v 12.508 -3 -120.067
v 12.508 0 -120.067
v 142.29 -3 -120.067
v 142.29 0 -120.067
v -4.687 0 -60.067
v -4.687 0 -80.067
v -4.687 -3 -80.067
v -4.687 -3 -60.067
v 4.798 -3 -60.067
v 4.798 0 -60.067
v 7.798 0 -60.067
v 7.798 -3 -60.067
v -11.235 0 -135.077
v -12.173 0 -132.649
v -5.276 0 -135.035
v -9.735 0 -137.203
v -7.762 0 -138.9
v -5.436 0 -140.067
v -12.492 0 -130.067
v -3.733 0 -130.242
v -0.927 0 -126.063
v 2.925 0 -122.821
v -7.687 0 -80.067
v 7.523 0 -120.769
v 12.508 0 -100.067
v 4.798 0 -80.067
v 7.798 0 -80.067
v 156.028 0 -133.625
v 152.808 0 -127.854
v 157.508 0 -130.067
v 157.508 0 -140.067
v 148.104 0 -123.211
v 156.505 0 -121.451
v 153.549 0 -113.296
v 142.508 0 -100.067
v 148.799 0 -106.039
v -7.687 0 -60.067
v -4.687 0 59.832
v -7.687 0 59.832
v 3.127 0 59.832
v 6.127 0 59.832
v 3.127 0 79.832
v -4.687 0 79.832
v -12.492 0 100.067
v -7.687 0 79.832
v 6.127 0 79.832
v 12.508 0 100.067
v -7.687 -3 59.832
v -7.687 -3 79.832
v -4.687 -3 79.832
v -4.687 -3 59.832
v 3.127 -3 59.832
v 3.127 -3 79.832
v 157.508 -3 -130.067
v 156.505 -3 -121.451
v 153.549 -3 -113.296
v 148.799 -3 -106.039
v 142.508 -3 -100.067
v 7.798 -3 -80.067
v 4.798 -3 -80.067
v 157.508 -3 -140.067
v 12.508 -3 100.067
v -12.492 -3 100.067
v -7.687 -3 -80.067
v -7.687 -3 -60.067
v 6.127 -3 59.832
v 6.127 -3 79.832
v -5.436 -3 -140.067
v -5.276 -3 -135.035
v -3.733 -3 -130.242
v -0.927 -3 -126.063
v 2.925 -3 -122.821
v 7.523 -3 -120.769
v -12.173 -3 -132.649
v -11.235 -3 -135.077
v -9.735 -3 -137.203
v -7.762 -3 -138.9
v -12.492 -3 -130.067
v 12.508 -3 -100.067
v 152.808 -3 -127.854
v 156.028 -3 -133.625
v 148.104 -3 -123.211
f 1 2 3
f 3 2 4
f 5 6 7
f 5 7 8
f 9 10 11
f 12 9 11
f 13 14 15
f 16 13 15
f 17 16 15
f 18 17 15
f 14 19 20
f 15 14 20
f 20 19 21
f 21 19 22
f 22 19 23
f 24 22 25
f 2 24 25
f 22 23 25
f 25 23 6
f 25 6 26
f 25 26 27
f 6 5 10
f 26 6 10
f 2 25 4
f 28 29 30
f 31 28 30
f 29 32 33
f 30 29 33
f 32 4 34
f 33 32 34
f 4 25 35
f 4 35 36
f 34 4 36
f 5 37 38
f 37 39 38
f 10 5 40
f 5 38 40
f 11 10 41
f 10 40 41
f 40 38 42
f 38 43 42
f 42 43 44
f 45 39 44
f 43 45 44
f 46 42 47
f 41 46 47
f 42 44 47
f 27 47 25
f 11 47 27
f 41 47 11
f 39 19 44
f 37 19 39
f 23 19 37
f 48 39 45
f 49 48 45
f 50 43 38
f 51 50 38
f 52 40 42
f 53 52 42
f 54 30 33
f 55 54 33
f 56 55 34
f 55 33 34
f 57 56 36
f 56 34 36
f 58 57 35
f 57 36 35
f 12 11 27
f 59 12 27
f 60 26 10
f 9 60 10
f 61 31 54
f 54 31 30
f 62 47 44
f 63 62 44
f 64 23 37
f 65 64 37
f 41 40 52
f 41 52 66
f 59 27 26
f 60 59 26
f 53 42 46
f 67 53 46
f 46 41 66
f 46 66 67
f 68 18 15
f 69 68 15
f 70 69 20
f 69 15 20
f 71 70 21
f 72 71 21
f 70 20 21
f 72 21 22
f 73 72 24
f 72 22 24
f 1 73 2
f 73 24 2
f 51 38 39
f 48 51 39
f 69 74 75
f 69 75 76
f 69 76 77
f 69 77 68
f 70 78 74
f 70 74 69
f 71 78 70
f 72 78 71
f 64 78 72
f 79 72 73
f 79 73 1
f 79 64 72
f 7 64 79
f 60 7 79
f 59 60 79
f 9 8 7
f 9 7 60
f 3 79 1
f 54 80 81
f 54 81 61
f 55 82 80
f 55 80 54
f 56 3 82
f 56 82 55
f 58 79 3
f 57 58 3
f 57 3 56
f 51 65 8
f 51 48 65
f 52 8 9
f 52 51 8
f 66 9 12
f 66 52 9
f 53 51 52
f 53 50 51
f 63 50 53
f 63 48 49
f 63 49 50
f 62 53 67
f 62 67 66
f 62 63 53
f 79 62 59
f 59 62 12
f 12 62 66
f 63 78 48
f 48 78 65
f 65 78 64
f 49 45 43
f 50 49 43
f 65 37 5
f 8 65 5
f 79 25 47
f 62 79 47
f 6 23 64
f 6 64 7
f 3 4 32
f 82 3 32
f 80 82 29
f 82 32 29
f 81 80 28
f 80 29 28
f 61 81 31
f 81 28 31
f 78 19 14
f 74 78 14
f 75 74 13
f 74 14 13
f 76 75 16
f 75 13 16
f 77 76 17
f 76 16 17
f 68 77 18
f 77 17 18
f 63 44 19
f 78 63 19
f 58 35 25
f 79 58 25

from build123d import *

# Parameters (mm, degrees)
F0_W     = 3
F0_H     = 20
F0_W_2   = 3.000302
F1_DEPTH = 3


with BuildPart() as f1:
    # F0 (on Front) → F1 (new body)
    with BuildSketch(Plane.XZ):
        with BuildLine():
            Line((12.508355, -100.066841), (12.508355, 100.066841))
            Line((12.508355, 100.066841), (-12.491645, 100.066841))
            Line((-12.491645, 100.066841), (-12.491645, -100.066841))
            Line((-12.491645, -100.066841), (-12.491645, -130.066841))
            ThreePointArc((-12.491645, -130.066841), (-10.550096, -136.186191), (-5.435743, -140.066841))
            ThreePointArc((-5.435743, -140.066841), (-0.926587, -126.062712), (12.508355, -120.066841))
            Line((12.508355, -120.066841), (20.482657, -120.066841))
            Line((20.482657, -120.066841), (142.29022, -120.066841))
            ThreePointArc((142.29022, -120.066841), (152.807868, -127.853683), (157.508355, -140.066841))
            Line((157.508355, -140.066841), (157.508355, -130.066841))
            ThreePointArc((157.508355, -130.066841), (153.549375, -113.296332), (142.508355, -100.066841))
            Line((142.508355, -100.066841), (12.508355, -100.066841))
        make_face()
        with Locations((-6.187321, -70.066841)):
            Rectangle(F0_W, F0_H, mode=Mode.SUBTRACT)
        Polygon((4.798322, -60.066841), (6.254178, -60.066841), (7.798322, -60.066841), (7.798322, -80.066841), (4.798322, -80.066841), align=None, mode=Mode.SUBTRACT)
        Polygon((-4.687321, 59.832168), (-6.230536, 59.832168), (-6.254178, 59.832168), (-7.687321, 59.832168), (-7.687321, 79.832168), (-4.687321, 79.832168), align=None, mode=Mode.SUBTRACT)
        with Locations((4.62724, 69.832168)):
            Rectangle(F0_W_2, F0_H, mode=Mode.SUBTRACT)
    extrude(amount=F1_DEPTH)


solid = f1.part
